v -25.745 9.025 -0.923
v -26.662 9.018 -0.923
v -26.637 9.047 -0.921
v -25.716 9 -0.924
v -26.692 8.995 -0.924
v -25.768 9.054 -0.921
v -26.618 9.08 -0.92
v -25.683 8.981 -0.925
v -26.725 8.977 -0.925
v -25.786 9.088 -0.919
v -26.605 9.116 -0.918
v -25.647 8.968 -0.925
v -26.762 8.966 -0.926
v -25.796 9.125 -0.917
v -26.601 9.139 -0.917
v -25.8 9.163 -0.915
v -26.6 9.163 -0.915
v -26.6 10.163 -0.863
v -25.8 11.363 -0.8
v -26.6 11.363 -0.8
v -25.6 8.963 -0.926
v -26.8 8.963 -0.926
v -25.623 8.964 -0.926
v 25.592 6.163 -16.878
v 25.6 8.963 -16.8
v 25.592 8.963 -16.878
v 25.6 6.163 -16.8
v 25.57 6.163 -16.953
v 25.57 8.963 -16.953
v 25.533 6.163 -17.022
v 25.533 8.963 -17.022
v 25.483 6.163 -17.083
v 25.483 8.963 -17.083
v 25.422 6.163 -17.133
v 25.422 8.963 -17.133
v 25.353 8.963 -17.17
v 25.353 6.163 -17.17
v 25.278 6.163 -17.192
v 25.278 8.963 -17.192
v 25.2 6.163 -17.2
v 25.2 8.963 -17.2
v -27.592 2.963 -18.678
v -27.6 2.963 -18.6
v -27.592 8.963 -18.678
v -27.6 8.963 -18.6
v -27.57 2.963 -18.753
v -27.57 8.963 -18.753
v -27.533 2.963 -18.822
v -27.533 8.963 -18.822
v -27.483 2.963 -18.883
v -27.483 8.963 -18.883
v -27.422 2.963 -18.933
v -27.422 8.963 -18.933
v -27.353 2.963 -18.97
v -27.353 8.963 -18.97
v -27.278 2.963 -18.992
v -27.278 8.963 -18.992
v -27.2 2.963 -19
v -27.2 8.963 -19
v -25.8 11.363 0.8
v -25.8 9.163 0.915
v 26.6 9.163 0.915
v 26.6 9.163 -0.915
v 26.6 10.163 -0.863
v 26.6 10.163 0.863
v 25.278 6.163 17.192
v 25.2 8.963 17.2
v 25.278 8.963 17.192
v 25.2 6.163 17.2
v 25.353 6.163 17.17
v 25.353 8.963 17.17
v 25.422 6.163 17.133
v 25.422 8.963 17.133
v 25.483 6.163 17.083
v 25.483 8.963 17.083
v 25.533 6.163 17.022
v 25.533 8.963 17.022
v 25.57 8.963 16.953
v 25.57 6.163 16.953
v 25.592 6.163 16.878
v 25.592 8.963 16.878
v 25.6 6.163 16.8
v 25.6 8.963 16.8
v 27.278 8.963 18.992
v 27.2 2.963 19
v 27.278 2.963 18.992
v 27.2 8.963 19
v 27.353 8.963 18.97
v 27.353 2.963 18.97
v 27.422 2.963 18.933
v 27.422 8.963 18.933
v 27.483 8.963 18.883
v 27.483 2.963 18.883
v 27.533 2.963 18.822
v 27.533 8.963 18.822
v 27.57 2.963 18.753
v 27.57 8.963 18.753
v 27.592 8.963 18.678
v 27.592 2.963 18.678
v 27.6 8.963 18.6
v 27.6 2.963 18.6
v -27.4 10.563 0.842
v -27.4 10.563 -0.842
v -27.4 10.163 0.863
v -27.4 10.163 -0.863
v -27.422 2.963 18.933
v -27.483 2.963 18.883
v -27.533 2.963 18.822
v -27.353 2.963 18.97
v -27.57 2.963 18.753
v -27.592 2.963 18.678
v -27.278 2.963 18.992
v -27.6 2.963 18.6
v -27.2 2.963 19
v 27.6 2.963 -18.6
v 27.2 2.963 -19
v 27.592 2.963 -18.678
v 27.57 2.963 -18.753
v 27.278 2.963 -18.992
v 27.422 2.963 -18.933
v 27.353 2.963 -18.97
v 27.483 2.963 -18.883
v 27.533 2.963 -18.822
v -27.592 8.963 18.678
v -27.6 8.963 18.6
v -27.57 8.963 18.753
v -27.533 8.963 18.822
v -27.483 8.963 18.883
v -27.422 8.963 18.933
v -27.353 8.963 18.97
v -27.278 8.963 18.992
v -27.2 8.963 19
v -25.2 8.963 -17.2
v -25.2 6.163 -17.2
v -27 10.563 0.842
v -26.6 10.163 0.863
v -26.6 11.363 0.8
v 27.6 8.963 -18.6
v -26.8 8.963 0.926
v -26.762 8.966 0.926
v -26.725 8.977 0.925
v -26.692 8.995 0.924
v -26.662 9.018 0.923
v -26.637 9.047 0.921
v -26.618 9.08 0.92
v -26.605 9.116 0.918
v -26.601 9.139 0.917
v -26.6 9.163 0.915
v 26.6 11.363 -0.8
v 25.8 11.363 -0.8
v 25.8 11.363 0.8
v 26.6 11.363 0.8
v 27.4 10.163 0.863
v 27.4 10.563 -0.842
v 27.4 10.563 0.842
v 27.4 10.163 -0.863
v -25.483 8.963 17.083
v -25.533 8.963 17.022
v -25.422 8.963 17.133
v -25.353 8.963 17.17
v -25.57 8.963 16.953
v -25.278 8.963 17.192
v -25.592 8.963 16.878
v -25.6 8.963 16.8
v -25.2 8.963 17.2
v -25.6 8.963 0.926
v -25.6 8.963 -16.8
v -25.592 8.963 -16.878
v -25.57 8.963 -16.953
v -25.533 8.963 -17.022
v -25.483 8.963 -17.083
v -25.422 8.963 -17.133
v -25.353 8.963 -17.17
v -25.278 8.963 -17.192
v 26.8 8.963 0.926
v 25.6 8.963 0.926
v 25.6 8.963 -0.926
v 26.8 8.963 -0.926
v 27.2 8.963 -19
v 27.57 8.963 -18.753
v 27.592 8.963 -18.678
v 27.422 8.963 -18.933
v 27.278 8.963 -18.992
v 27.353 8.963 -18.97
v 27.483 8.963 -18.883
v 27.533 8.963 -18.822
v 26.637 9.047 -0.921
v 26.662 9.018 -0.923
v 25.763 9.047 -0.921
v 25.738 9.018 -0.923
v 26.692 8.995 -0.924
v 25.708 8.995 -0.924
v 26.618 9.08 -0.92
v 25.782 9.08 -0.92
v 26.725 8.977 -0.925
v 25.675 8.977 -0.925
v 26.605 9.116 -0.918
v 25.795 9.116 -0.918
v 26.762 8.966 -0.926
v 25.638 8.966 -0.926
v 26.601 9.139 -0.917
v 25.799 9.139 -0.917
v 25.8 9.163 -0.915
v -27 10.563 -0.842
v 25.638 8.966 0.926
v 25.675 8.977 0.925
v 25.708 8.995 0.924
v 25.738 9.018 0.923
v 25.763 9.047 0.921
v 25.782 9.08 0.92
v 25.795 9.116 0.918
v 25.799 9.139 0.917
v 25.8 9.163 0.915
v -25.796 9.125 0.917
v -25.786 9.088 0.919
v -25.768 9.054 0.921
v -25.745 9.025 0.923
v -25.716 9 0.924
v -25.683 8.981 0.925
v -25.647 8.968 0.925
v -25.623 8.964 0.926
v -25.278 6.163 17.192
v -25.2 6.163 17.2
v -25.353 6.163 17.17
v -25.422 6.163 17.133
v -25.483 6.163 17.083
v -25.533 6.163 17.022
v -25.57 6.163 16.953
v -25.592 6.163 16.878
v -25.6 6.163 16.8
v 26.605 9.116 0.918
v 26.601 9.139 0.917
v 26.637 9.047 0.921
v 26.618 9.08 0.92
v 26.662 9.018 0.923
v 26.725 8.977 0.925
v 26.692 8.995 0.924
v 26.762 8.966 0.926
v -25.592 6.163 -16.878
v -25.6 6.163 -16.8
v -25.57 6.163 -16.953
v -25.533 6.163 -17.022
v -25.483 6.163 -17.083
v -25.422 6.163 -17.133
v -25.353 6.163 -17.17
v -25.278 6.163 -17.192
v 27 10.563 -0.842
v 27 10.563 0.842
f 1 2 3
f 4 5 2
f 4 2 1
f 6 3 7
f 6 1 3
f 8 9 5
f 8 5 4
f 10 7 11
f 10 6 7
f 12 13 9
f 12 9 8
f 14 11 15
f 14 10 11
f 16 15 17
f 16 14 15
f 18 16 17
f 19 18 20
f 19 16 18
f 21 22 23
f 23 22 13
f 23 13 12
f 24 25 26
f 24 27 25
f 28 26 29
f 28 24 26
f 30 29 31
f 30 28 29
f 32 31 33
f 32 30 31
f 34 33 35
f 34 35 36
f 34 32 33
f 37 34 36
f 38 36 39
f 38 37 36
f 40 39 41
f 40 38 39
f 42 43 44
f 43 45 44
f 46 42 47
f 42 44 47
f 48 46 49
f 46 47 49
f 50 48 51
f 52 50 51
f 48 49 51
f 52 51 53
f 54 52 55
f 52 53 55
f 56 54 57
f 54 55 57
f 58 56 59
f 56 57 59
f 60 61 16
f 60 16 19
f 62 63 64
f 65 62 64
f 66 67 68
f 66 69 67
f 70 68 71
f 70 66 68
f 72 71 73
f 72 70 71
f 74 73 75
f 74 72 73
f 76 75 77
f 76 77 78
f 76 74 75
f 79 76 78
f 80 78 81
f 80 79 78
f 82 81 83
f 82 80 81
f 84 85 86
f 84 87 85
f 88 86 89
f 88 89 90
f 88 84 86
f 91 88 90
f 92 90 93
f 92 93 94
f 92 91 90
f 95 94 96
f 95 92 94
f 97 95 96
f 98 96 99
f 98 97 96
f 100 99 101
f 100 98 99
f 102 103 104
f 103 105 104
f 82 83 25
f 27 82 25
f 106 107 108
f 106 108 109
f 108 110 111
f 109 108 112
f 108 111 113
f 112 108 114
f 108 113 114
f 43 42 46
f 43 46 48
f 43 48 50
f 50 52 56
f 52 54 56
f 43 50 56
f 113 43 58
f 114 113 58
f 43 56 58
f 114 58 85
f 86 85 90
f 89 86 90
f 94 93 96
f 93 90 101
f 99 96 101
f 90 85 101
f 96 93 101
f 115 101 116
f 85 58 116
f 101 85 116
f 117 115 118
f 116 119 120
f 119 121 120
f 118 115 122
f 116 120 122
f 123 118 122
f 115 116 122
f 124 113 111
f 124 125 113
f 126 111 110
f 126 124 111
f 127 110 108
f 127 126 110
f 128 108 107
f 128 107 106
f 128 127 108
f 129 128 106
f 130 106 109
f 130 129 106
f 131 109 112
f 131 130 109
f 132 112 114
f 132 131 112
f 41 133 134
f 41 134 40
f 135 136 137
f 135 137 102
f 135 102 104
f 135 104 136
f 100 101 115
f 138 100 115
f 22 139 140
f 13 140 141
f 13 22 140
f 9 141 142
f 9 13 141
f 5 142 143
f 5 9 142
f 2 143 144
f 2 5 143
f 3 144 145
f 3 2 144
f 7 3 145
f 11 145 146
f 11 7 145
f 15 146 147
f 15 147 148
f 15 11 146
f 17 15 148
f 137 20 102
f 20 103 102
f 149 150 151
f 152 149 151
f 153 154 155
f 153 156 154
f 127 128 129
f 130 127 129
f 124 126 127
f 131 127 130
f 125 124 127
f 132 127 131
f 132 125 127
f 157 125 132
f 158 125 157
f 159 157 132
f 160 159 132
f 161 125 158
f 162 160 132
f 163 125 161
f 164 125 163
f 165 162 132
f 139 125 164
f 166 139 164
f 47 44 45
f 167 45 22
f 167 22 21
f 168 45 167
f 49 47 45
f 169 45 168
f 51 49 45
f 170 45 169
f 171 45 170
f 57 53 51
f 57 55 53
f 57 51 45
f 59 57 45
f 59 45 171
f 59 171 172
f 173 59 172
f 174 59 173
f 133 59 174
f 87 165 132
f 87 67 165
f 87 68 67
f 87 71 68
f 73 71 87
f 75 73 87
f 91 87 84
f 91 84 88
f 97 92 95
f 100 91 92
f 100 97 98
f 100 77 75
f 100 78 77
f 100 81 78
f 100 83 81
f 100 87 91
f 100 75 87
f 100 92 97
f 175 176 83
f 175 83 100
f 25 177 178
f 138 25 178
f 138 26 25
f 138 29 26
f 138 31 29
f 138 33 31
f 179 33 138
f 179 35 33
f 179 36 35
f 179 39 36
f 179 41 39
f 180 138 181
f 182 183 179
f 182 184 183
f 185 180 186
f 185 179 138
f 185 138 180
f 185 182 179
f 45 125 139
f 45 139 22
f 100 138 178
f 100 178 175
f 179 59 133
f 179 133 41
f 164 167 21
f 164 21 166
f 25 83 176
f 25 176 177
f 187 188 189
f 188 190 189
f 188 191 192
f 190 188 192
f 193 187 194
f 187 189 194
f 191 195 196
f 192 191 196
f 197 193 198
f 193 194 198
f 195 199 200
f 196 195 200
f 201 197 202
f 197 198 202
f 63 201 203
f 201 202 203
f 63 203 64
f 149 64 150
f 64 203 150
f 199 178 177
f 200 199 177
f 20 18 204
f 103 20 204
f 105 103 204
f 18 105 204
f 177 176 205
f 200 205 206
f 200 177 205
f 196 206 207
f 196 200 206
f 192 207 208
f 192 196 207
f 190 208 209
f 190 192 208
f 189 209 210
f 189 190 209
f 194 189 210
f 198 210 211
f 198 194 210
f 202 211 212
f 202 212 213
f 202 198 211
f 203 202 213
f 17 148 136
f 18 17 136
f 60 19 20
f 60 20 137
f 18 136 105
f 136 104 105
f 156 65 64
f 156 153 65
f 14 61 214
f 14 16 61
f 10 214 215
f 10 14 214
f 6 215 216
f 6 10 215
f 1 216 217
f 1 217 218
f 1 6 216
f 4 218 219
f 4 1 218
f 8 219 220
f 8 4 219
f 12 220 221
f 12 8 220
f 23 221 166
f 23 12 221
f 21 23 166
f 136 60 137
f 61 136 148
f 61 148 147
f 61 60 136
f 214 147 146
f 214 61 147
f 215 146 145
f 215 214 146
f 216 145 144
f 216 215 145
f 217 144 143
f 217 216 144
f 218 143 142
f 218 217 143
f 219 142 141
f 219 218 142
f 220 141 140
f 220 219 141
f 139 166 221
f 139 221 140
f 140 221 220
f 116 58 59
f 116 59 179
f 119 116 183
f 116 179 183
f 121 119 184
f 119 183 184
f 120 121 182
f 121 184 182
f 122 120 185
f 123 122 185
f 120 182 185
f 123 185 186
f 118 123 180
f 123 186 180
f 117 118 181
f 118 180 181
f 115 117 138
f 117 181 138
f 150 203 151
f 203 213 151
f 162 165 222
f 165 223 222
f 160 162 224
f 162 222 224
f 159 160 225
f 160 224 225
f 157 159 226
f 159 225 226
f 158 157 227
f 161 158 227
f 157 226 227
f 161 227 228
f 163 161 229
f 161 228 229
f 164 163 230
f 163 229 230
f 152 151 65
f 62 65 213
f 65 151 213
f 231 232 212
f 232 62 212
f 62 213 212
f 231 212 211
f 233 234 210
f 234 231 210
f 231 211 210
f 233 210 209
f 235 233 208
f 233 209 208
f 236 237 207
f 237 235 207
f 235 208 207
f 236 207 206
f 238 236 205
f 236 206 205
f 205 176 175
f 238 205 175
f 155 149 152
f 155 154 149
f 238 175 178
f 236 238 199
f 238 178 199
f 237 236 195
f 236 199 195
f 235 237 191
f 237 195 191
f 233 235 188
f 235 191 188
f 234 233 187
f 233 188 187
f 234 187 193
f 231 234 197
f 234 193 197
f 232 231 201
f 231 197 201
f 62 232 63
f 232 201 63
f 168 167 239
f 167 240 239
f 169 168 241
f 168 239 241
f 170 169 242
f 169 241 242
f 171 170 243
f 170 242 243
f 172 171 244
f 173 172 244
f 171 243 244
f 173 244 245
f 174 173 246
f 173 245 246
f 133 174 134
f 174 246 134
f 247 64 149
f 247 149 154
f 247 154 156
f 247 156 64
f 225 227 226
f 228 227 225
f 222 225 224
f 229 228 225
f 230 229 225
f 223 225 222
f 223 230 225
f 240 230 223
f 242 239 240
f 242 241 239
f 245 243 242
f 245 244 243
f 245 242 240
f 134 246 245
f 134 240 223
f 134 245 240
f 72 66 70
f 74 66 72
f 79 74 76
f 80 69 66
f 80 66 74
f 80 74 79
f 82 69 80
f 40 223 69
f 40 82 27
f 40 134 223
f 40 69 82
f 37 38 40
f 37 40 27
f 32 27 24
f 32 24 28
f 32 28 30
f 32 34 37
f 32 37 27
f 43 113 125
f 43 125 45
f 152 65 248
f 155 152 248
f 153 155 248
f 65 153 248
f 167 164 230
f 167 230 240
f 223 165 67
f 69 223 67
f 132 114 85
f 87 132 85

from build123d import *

# Parameters (mm, degrees)
SKETCH1_W           = 138
SKETCH1_H           = 95
BOSS_EXTRUDE1_DEPTH = 15
SKETCH2_W           = 128
SKETCH2_H           = 86
CUT_EXTRUDE1_DEPTH  = 7
SNAP_START          = 64.5
SNAP_HOOK2_DEPTH    = 2
SNAP_HOOK2_2_DEPTH  = 2
FILLET1_R           = 1
FILLET2_R           = 0.5
SCALE1_SCALE        = 0.4


with BuildPart() as part:
    # Sketch1 → Boss-Extrude1 (new body)
    with BuildSketch(Plane(origin=(0, 0, 0), x_dir=(1, 0, 0), z_dir=(0, 1, 0))):
        Rectangle(SKETCH1_W, SKETCH1_H)
    extrude(amount=BOSS_EXTRUDE1_DEPTH)

    # Sketch2 → Cut-Extrude1 (cut)
    with BuildSketch(Plane(origin=(0, 15, 0), x_dir=(1, 0, 0), z_dir=(0, 1, 0))):
        Rectangle(SKETCH2_W, SKETCH2_H)
    extrude(amount=-CUT_EXTRUDE1_DEPTH, mode=Mode.SUBTRACT)



with BuildPart() as body_2:
    # Snap Hook2: read off the stored shape, not the designer's step
    # Snap Hook2 outline → Snap Hook2 (new body)
    with BuildSketch(Plane.YZ.offset(SNAP_START)):
        Polygon((21, -2), (21, 2), (18, 2.157223338), (18, -2.157223338), align=None)
    snap_hook2 = extrude(amount=SNAP_HOOK2_DEPTH)


with BuildPart() as part_1:
    add(part.part)

    add(body_2.part)  # Snap Hook2 2 merges body 2
    # Snap Hook2 2 outline → Snap Hook2 2 (add)
    with BuildSketch(Plane.YZ.offset(SNAP_START)):
        Polygon((18, -2.157223338), (18, 2.157223338), (15, 2.314446676), (15, -2.314446676), align=None)
    snap_hook2_2 = extrude(amount=SNAP_HOOK2_2_DEPTH)

    # Snap Hook2 3: loft between two sections, ruled curve by curve
    snap_hook2_3_from = [
        Edge.make_line((66.5, 21, -2), (66.5, 21, 2)),
        Edge.make_line((66.5, 18, 2.157223338), (66.5, 18, -2.157223338)),
        Edge.make_line((66.5, 18, 2.157223338), (66.5, 21, 2)),
        Edge.make_line((66.5, 18, -2.157223338), (66.5, 21, -2)),
    ]
    snap_hook2_3_to = [
        Edge.make_line((68.5, 19, -2.104815559), (68.5, 19, 2.104815559)),
        Edge.make_line((68.5, 18, 2.157223338), (68.5, 18, -2.157223338)),
        Edge.make_line((68.5, 18, 2.157223338), (68.5, 19, 2.104815559)),
        Edge.make_line((68.5, 18, -2.157223338), (68.5, 19, -2.104815559)),
    ]
    snap_hook2_3 = Solid(Shell([*[Face.make_surface_from_curves(snap_hook2_3_from[k], snap_hook2_3_to[k]) for k in range(4)], Face(Wire(snap_hook2_3_from)), Face(Wire(snap_hook2_3_to))]))
    add(snap_hook2_3)

    # Fillet1
    fillet1_edges = [part_1.edges().sort_by_distance(p)[0] for p in [
        (64, 11.5, -43),
        (64, 11.5, 43),
        (-64, 11.5, 43),
        (-64, 11.5, -43),
        (-69, 7.5, -47.5),
        (69, 7.5, -47.5),
        (69, 7.5, 47.5),
        (-69, 7.5, 47.5),
    ]]
    fillet(fillet1_edges, radius=FILLET1_R)

    # Mirror1: Snap Hook2, Snap Hook2 2, Snap Hook2 3 across plane
    add(snap_hook2.mirror(Plane(origin=(0, 0, 0), x_dir=(0, 0, 1), z_dir=(1, 0, 0))))
    add(snap_hook2_2.mirror(Plane(origin=(0, 0, 0), x_dir=(0, 0, 1), z_dir=(1, 0, 0))))
    add(snap_hook2_3.mirror(Plane(origin=(0, 0, 0), x_dir=(0, 0, 1), z_dir=(1, 0, 0))))

    # Fillet2
    fillet2_edges = [part_1.edges().sort_by_distance(p)[0] for p in [
        (66.5, 15, 0),
        (64.5, 15, 0),
        (-66.5, 15, 0),
        (-64.5, 15, 0),
    ]]
    fillet(fillet2_edges, radius=FILLET2_R - 0.0001)  # a hair under: the kernel refuses the full size


with BuildPart() as part_2:
    # Scale1: scaled about (0, 4.938102716, 0)
    add(part_1.part.scale(SCALE1_SCALE).moved(Location((0, 2.96286163, 0))))


solid = part_2.part
